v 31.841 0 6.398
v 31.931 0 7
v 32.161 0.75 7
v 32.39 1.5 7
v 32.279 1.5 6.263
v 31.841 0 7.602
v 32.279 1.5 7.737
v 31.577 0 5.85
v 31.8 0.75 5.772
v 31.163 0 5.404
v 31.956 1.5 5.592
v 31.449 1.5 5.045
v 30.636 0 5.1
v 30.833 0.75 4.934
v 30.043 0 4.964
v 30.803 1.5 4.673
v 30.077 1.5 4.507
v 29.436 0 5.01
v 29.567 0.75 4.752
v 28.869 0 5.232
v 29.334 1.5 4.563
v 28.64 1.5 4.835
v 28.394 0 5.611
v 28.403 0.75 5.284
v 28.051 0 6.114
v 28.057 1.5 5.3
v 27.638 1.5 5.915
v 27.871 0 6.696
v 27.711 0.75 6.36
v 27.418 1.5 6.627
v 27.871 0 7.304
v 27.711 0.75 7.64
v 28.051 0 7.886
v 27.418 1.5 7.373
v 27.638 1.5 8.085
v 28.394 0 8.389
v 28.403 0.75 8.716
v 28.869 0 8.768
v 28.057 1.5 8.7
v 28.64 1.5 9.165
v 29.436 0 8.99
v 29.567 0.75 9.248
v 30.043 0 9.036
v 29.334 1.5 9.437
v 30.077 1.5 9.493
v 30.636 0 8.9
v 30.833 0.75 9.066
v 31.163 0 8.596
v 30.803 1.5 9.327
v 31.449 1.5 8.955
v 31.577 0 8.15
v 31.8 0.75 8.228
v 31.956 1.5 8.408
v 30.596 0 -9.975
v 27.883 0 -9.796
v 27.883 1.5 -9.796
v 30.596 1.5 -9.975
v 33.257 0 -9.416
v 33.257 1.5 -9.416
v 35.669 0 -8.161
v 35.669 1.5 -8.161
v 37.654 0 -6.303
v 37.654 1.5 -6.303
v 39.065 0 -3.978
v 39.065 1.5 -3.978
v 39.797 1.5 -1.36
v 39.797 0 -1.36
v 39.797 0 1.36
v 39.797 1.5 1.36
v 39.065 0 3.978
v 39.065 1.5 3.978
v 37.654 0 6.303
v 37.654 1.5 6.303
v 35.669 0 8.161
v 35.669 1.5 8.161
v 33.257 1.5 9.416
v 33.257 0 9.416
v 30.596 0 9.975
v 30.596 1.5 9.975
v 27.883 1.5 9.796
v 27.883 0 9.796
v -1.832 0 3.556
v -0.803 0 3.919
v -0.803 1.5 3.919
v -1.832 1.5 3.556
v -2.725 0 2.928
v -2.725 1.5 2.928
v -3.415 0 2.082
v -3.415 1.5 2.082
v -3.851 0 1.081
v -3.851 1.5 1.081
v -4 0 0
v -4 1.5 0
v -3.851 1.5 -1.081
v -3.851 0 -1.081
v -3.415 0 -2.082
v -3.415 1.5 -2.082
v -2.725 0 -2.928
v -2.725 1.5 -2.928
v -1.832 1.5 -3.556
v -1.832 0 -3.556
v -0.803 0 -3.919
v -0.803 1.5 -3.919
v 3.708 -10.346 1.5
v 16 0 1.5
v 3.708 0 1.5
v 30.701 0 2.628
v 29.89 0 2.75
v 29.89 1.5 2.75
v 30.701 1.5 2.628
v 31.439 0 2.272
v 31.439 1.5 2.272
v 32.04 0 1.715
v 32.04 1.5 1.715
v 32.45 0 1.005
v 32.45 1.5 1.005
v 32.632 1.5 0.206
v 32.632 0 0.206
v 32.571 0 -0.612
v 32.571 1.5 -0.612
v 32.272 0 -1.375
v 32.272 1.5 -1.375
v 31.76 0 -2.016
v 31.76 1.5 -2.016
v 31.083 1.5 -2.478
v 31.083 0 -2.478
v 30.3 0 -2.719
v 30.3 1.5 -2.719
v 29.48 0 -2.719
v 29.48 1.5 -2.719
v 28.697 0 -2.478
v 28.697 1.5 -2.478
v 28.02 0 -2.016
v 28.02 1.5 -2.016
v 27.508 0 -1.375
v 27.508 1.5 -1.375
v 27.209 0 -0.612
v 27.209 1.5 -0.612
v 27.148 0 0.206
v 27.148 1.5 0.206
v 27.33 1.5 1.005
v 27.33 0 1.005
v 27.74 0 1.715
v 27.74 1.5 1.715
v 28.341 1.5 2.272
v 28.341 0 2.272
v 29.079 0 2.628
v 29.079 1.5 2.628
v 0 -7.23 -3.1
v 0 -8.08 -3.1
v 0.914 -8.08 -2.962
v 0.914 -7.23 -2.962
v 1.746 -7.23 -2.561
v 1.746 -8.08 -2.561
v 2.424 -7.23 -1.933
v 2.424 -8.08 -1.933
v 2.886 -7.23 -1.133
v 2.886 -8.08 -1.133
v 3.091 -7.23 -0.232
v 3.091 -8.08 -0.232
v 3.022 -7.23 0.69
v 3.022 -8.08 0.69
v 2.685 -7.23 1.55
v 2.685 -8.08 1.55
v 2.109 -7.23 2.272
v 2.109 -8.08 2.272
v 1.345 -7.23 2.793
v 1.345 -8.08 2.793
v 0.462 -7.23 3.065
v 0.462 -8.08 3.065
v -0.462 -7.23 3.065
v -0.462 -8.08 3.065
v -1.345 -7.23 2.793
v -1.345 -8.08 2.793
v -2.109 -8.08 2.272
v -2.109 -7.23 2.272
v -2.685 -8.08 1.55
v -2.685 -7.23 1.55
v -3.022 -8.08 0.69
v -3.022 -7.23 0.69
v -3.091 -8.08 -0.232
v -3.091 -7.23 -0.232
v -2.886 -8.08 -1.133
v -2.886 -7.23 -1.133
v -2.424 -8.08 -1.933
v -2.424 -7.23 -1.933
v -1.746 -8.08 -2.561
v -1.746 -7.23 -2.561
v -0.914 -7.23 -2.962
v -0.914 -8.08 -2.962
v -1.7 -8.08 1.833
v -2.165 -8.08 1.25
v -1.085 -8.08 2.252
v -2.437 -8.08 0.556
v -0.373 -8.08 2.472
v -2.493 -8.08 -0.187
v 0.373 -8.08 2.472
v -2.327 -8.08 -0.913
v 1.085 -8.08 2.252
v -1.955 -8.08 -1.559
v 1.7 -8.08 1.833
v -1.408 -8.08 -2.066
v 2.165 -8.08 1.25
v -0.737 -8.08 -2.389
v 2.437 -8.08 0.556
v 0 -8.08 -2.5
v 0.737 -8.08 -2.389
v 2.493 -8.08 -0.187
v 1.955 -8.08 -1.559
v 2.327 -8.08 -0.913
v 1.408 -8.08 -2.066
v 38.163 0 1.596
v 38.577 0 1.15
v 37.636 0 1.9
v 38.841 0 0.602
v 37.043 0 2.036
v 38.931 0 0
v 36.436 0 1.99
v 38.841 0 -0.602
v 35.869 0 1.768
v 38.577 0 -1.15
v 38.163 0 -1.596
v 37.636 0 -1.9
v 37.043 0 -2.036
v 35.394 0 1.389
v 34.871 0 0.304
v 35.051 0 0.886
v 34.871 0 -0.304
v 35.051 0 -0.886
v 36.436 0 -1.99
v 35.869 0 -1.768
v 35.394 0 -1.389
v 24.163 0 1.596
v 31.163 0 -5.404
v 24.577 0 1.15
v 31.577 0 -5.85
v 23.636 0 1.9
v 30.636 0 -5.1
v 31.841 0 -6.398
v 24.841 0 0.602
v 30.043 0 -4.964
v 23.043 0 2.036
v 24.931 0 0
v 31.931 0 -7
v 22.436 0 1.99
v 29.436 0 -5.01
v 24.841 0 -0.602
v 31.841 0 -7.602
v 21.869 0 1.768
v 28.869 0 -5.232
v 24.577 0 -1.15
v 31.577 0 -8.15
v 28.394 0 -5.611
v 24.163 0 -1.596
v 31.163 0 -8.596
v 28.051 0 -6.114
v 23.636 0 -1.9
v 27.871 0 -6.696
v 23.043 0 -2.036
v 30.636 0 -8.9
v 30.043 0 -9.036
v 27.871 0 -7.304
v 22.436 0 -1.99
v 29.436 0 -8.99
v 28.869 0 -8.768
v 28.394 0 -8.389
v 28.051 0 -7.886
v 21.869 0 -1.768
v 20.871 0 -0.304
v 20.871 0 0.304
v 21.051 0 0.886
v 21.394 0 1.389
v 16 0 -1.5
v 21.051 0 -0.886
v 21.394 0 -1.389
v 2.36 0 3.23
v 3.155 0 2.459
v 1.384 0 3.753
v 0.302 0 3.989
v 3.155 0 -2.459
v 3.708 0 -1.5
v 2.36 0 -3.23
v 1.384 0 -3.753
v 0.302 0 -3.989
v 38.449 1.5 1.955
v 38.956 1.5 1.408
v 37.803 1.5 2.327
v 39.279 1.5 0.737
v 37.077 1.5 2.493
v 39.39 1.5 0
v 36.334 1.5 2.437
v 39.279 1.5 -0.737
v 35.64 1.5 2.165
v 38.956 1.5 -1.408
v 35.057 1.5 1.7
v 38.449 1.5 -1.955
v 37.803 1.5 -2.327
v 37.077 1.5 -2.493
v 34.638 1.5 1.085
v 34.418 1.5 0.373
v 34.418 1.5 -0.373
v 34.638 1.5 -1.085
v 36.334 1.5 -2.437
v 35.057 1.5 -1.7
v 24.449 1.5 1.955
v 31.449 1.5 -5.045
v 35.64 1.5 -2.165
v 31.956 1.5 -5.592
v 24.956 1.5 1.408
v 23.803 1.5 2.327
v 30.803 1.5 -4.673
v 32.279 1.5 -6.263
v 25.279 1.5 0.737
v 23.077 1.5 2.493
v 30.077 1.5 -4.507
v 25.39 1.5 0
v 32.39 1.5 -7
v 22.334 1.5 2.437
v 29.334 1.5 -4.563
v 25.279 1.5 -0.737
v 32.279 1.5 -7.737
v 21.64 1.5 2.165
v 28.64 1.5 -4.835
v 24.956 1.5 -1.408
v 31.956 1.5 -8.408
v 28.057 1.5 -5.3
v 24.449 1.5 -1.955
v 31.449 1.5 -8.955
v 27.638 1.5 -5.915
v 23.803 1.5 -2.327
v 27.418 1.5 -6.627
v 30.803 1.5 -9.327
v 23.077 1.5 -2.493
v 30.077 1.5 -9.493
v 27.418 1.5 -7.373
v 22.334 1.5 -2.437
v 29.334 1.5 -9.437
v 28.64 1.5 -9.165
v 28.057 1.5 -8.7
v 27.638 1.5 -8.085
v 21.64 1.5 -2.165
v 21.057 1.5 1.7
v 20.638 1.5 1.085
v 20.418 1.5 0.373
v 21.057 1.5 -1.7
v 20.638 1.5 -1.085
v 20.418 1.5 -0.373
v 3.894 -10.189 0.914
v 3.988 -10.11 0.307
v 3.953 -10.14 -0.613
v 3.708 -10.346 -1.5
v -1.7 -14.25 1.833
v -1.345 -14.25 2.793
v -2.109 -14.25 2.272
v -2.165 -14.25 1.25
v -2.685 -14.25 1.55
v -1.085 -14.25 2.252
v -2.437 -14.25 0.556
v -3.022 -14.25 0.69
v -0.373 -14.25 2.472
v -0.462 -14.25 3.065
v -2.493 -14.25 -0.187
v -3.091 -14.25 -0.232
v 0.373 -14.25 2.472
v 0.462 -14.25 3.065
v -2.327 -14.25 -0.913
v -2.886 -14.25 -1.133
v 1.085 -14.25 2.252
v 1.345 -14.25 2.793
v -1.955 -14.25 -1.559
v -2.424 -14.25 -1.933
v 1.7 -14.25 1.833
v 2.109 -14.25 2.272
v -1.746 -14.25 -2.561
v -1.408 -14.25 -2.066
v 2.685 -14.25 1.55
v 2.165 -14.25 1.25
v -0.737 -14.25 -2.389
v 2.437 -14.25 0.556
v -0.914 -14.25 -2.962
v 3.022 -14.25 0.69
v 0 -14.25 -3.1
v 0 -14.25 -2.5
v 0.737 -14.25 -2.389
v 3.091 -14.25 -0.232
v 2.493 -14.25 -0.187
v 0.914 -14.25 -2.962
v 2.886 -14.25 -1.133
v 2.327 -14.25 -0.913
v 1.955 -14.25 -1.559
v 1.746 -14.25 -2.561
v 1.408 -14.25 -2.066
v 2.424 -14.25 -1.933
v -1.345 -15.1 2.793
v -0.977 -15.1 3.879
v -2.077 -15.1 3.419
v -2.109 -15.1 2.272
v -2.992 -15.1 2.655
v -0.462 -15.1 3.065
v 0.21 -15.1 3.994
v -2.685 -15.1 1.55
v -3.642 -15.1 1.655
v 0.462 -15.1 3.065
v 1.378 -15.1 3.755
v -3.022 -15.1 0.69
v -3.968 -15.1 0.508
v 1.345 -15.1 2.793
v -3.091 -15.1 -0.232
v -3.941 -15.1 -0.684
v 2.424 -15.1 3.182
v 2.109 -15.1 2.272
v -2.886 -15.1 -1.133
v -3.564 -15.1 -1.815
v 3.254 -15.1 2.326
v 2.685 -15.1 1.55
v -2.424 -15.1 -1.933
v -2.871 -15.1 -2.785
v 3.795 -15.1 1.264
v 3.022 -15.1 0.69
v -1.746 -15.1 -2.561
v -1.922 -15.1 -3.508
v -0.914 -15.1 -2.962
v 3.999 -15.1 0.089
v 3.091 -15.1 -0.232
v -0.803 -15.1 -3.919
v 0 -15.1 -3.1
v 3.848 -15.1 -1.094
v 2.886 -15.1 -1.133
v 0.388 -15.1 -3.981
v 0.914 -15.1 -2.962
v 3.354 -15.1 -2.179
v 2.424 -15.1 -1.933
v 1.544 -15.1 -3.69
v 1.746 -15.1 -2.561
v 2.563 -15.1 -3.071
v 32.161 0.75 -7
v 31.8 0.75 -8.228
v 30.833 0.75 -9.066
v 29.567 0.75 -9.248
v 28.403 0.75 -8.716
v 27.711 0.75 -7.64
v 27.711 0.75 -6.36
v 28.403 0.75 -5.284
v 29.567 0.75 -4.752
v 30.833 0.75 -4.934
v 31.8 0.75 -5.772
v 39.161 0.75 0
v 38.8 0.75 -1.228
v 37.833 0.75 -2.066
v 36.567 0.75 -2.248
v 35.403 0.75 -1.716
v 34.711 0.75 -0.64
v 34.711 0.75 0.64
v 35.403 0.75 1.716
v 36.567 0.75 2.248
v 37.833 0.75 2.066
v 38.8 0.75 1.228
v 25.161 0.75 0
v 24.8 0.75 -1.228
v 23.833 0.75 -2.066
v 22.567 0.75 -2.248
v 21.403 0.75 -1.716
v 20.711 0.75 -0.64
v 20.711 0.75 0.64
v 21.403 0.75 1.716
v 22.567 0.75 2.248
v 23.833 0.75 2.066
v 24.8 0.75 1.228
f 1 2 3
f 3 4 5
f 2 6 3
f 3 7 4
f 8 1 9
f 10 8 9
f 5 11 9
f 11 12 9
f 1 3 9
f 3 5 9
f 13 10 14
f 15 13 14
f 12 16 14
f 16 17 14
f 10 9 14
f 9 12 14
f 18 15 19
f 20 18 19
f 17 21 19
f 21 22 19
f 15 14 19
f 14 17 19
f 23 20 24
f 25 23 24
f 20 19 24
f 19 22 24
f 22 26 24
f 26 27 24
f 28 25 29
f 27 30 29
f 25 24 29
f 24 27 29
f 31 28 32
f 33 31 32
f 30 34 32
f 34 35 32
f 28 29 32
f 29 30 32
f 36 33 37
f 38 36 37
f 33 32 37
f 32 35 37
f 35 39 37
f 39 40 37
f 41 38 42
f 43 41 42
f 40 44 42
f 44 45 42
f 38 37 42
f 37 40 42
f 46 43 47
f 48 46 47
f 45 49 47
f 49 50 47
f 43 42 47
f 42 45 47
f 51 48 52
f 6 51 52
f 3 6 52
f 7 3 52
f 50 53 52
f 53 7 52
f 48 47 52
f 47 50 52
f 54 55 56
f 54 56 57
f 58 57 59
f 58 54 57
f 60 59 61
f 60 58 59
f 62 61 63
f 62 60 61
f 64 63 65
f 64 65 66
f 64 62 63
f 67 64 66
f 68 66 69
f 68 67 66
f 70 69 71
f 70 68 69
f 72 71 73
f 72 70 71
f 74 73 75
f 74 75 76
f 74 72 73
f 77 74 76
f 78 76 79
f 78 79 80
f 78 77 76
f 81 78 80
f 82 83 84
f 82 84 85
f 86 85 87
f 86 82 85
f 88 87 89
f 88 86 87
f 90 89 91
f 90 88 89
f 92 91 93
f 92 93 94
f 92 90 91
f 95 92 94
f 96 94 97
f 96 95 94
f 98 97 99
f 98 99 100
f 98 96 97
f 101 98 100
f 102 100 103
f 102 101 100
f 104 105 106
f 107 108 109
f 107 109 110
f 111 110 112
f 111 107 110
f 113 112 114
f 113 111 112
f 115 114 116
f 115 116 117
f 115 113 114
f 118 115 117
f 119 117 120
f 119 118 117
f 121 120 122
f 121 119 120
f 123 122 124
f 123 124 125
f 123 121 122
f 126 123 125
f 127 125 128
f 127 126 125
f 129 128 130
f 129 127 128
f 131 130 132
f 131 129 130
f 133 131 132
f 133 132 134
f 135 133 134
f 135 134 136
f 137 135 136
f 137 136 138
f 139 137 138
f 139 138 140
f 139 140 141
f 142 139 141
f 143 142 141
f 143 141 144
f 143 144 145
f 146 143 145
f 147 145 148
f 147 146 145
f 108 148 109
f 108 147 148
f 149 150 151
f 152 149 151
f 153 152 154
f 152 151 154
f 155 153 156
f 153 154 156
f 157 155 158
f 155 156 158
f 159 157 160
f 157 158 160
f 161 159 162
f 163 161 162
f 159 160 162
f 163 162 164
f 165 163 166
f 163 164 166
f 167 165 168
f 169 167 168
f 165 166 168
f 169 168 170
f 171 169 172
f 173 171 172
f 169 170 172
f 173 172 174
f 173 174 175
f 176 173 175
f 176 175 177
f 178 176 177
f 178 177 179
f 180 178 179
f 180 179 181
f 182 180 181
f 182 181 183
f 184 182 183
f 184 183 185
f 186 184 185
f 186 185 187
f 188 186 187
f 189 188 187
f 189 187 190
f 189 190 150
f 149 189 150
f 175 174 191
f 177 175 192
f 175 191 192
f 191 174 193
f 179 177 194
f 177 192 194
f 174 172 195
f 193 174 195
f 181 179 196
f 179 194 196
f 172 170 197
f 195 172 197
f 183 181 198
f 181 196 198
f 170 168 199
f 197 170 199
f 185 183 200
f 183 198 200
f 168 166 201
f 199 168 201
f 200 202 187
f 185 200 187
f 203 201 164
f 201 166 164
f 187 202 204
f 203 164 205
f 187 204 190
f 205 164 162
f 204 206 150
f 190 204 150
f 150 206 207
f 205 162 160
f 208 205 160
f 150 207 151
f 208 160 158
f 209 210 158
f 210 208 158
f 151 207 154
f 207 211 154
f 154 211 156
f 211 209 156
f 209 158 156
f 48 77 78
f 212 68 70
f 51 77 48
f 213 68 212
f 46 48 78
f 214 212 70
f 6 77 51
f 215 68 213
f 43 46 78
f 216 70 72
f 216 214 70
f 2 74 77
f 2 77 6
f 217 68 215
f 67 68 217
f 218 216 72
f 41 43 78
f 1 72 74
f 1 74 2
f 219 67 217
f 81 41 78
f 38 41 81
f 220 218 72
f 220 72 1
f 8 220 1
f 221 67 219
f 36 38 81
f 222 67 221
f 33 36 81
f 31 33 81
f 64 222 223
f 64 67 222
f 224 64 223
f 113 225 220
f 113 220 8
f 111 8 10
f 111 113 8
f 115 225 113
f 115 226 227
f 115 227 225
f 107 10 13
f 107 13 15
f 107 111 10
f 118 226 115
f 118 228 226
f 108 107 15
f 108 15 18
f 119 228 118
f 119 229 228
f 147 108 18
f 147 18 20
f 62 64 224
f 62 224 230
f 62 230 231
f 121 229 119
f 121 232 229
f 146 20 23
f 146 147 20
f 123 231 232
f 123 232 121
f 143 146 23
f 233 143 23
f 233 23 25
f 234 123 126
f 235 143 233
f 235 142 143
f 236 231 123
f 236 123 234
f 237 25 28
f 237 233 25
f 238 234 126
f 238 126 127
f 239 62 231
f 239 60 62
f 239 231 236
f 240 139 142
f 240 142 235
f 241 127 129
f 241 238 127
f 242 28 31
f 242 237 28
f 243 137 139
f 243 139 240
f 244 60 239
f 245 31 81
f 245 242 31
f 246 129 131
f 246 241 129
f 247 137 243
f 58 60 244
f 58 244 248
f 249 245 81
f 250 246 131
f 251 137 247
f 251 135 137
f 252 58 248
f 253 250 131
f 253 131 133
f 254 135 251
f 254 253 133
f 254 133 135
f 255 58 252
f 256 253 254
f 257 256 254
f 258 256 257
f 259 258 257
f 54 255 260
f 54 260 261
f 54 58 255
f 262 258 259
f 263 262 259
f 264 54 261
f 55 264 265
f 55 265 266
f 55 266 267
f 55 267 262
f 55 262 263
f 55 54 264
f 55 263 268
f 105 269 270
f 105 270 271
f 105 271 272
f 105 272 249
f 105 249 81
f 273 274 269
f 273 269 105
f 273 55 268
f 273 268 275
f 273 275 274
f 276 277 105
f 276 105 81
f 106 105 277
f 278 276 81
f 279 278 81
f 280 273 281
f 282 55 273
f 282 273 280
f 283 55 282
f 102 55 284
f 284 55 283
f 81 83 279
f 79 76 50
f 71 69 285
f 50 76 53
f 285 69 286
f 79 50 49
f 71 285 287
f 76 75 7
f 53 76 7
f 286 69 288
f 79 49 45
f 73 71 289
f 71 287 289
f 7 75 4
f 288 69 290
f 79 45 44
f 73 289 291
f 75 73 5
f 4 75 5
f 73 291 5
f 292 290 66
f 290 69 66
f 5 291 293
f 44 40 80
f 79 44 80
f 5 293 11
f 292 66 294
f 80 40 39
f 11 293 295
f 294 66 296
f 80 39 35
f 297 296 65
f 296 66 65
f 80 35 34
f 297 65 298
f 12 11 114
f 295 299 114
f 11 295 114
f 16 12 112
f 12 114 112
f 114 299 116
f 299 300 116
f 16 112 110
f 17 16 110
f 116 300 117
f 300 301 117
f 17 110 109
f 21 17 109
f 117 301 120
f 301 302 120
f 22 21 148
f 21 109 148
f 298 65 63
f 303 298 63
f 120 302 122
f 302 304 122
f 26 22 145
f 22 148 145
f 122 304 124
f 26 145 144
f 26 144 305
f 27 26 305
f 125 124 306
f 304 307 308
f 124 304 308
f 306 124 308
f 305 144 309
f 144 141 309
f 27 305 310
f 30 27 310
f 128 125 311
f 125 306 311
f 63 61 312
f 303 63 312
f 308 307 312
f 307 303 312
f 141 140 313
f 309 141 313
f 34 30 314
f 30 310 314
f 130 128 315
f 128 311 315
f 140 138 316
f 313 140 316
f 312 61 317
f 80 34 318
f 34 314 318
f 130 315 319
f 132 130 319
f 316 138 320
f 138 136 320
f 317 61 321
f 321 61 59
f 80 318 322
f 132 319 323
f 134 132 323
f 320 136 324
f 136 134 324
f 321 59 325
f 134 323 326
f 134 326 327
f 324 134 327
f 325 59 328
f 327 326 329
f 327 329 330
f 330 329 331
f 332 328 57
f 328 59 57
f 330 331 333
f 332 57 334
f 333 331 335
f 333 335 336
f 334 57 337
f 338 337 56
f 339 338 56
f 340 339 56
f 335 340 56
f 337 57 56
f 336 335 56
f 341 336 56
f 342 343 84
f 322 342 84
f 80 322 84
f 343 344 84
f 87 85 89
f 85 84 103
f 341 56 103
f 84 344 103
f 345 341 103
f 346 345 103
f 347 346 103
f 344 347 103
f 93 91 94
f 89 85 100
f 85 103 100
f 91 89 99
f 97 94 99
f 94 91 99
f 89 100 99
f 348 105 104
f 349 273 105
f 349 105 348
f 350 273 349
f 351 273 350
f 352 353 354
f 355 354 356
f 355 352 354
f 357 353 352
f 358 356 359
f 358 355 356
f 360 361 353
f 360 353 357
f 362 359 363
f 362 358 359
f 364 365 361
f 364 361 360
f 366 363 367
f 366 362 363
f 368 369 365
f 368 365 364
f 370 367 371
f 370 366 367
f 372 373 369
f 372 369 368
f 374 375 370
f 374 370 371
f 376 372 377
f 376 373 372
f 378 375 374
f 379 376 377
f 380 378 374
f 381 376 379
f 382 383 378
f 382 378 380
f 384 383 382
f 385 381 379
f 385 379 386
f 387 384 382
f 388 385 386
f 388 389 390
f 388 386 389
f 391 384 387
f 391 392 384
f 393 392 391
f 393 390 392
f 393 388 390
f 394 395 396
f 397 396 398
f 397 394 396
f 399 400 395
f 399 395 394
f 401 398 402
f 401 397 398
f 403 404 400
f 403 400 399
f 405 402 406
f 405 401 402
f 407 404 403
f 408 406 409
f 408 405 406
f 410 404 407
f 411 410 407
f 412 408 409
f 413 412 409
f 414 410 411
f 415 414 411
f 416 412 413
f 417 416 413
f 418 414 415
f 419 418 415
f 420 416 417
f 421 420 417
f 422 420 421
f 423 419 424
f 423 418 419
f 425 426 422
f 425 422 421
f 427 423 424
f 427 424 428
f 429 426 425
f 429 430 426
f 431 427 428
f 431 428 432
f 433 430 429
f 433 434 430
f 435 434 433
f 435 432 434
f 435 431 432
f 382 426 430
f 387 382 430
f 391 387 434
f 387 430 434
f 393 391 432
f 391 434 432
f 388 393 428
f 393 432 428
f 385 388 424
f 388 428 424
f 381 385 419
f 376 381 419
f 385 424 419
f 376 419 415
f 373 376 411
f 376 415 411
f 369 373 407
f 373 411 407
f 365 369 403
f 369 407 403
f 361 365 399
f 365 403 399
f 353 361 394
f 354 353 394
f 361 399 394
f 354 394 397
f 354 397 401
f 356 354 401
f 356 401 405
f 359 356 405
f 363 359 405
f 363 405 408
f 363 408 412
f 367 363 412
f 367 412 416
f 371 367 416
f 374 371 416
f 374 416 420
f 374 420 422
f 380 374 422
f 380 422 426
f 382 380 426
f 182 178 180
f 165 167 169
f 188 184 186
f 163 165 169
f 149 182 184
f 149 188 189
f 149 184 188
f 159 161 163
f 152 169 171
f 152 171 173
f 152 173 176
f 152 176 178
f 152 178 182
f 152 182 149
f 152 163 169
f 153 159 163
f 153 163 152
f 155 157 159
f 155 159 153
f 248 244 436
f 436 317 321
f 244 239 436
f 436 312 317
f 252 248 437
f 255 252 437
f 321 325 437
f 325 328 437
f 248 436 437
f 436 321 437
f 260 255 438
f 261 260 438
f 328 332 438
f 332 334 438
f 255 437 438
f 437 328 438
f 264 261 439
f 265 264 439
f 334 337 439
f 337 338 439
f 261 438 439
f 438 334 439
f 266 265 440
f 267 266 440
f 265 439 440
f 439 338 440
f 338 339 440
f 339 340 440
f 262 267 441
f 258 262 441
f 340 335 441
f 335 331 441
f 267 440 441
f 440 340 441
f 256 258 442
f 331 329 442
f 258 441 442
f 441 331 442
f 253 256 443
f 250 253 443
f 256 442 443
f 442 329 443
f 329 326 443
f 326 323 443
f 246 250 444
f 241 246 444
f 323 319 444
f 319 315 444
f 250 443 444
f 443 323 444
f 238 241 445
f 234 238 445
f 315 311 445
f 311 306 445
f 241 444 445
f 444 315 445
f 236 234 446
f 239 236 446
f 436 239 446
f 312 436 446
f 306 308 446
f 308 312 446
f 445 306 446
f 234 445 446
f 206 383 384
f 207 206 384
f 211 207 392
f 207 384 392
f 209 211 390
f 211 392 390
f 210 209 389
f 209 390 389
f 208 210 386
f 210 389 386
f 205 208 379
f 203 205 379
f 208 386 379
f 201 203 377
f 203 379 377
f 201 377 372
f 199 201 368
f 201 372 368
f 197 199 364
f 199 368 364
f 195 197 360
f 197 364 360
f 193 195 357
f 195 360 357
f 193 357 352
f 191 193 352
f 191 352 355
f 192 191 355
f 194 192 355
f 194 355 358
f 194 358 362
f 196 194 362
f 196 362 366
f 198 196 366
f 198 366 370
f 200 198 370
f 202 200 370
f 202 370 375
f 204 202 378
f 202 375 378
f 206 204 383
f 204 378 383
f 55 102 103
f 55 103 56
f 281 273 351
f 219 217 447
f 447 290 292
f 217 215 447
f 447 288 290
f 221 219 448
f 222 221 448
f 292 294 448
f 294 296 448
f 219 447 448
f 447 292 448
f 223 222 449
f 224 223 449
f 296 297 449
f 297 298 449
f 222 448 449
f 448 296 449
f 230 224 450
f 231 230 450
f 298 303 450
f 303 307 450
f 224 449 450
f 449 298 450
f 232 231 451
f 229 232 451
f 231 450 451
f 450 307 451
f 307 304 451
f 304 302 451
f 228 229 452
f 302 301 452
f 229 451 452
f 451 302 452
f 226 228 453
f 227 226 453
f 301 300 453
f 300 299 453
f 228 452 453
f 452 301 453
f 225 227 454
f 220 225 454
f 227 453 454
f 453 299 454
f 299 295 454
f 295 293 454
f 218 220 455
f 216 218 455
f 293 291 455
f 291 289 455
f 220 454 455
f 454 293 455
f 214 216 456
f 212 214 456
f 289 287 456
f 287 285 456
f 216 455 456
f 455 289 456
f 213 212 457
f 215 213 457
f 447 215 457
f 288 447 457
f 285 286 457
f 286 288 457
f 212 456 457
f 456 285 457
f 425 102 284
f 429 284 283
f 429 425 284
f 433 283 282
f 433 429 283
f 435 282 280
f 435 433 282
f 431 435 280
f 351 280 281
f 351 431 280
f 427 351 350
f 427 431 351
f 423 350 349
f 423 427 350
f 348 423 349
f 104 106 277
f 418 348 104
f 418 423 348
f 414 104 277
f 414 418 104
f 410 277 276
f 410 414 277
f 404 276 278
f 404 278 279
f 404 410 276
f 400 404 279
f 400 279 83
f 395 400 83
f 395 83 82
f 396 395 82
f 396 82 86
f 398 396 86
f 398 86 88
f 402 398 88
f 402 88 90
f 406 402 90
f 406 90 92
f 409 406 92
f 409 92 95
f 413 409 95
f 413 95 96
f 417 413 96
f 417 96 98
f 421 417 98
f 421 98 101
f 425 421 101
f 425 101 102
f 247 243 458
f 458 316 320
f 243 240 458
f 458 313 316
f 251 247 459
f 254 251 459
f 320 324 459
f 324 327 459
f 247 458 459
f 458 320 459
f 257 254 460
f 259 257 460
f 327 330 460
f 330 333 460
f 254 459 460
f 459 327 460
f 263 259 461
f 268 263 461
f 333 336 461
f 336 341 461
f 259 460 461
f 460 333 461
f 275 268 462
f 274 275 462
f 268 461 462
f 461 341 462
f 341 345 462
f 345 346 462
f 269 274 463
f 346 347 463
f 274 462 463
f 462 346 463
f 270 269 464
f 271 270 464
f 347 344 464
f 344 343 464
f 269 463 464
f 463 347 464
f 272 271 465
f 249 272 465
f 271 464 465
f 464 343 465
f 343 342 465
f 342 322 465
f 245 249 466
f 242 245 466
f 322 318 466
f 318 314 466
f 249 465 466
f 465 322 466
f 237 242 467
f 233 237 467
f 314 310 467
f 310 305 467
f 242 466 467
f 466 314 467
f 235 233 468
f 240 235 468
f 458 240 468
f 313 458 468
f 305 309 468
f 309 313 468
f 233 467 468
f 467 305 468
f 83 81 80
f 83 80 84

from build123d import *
from build123d.topology import SkipClean

# Parameters (mm, degrees)
CROQUIS1_R                      = 1.6
CROQUIS1_R_2                    = 2.75
SALIENTE_EXTRUIR1_DEPTH         = 1.5
SALIENTE_EXTRUIR3_START         = 15.1
CROQUIS3_R                      = 4
SALIENTE_EXTRUIR3_DEPTH         = 15.1
CROQUIS4_R                      = 3.1
CORTAR_EXTRUIR1_DEPTH           = 7.87
SALIENTE_EXTRUIR4_START         = -0.85
CROQUIS4_3_R                    = 3.1
CROQUIS4_3_R_2                  = 2.5
SALIENTE_EXTRUIR4_DEPTH         = 6.17
CROQUIS5_R                      = 2.5
CORTAR_EXTRUIR3_DEPTH           = 1.5
CORTAR_EXTRUIR3_DRAFT           = -17
CORTAR_EXTRUIR3_PROFILE_2_DEPTH = 1.5
CORTAR_EXTRUIR3_PROFILE_2_DRAFT = -17
CORTAR_EXTRUIR3_PROFILE_3_DEPTH = 1.5
CORTAR_EXTRUIR3_PROFILE_3_DRAFT = -17
CORTAR_EXTRUIR3_PROFILE_4_DEPTH = 1.5
CORTAR_EXTRUIR3_PROFILE_4_DRAFT = -17
NERVIO1_REACH                   = 45.809
CROQUIS6_WALL_W                 = 105.302560272
CROQUIS6_WALL_H                 = 3


with BuildPart() as part:
    # Croquis1 → Saliente-Extruir1 (new body)
    with BuildSketch(Plane(origin=(0, 0, 0), x_dir=(1, 0, 0), z_dir=(0, 1, 0))):
        with BuildLine():
            Line((-0.802944128, 3.918581469), (27.882639679, 9.796453672))
            ThreePointArc((27.882639679, 9.796453672), (39.89, 0), (27.882639679, -9.796453672))
            Line((27.882639679, -9.796453672), (-0.802944128, -3.918581469))
            ThreePointArc((-0.802944128, -3.918581469), (-4, 0), (-0.802944128, 3.918581469))
        make_face()
        with Locations(Location((29.89, 7, 0), (0, 0, 270))):
            Circle(CROQUIS1_R, mode=Mode.SUBTRACT)
        with Locations(Location((36.89, 0, 0), (0, 0, 270))):
            Circle(CROQUIS1_R, mode=Mode.SUBTRACT)
        with Locations(Location((29.89, -7, 0), (0, 0, 270))):
            Circle(CROQUIS1_R, mode=Mode.SUBTRACT)
        with Locations(Location((22.89, 0, 0), (0, 0, 270))):
            Circle(CROQUIS1_R, mode=Mode.SUBTRACT)
        with Locations(Location((29.89, 0, 0), (0, 0, 270))):
            Circle(CROQUIS1_R_2, mode=Mode.SUBTRACT)
    extrude(amount=SALIENTE_EXTRUIR1_DEPTH)

    # Croquis3 → Saliente-Extruir3 (add)
    with SkipClean():  # the faces are left unmerged after this step: merging them gives an invalid solid
        with BuildSketch(Plane.XZ.offset(SALIENTE_EXTRUIR3_START)):
            with Locations(Location((0, 0, 0), (0, 0, 258.419996521))):
                Circle(CROQUIS3_R)
        extrude(amount=-SALIENTE_EXTRUIR3_DEPTH)

    # Croquis4 → Cortar-Extruir1 (cut)
    with SkipClean():  # the faces are left unmerged after this step: merging them gives an invalid solid
        with BuildSketch(Plane.XZ.offset(15.1)):
            with Locations(Location((0, 0, 0), (0, 0, 270))):
                Circle(CROQUIS4_R)
        extrude(amount=-CORTAR_EXTRUIR1_DEPTH, mode=Mode.SUBTRACT)

    # Croquis4<3> → Saliente-Extruir4 (add)
    with SkipClean():  # the faces are left unmerged after this step: merging them gives an invalid solid
        with BuildSketch(Plane.XZ.offset(15.1).offset(SALIENTE_EXTRUIR4_START)):
            with Locations(Location((0, 0, 0), (0, 0, 270))):
                Circle(CROQUIS4_3_R)
            with Locations(Location((0, 0, 0), (0, 0, 270))):
                Circle(CROQUIS4_3_R_2, mode=Mode.SUBTRACT)
        extrude(amount=-SALIENTE_EXTRUIR4_DEPTH)


with BuildPart() as cortar_extruir3_tool:
    # Croquis5 → Cortar-Extruir3 (with draft: the straight prism first)
    with BuildSketch(Plane(origin=(0, 1.5, 0), x_dir=(1, 0, 0), z_dir=(0, 1, 0))):
        with Locations((29.89, 7)):
            Circle(CROQUIS5_R)
    extrude(amount=-CORTAR_EXTRUIR3_DEPTH)
    # Cortar-Extruir3: the draft: its side faces are tilted about the plane it starts from
    cortar_extruir3_sides = [cortar_extruir3_tool.faces().sort_by_distance(p)[0] for p in [
        (27.39, 0.75, -7),
    ]]
    draft(cortar_extruir3_sides, Plane(origin=(0, 1.5, 0), x_dir=(1, 0, 0), z_dir=(0, 1, 0)), CORTAR_EXTRUIR3_DRAFT)


with BuildPart() as part_1:
    add(part.part)

    # Cortar-Extruir3: cut by cortar_extruir3_tool
    add(cortar_extruir3_tool.part, mode=Mode.SUBTRACT)


with BuildPart() as cortar_extruir3_profile_2_tool:
    # Croquis5 → Cortar-Extruir3 profile 2 (with draft: the straight prism first)
    with BuildSketch(Plane(origin=(0, 1.5, 0), x_dir=(1, 0, 0), z_dir=(0, 1, 0))):
        with Locations((36.89, 0)):
            Circle(CROQUIS5_R)
    extrude(amount=-CORTAR_EXTRUIR3_PROFILE_2_DEPTH)
    # Cortar-Extruir3 profile 2: the draft: its side faces are tilted about the plane it starts from
    cortar_extruir3_profile_2_sides = [cortar_extruir3_profile_2_tool.faces().sort_by_distance(p)[0] for p in [
        (34.39, 0.75, 0),
    ]]
    draft(cortar_extruir3_profile_2_sides, Plane(origin=(0, 1.5, 0), x_dir=(1, 0, 0), z_dir=(0, 1, 0)), CORTAR_EXTRUIR3_PROFILE_2_DRAFT)


with BuildPart() as part_2:
    add(part_1.part)

    # Cortar-Extruir3 profile 2: cut by cortar_extruir3_profile_2_tool
    add(cortar_extruir3_profile_2_tool.part, mode=Mode.SUBTRACT)


with BuildPart() as cortar_extruir3_profile_3_tool:
    # Croquis5 → Cortar-Extruir3 profile 3 (with draft: the straight prism first)
    with BuildSketch(Plane(origin=(0, 1.5, 0), x_dir=(1, 0, 0), z_dir=(0, 1, 0))):
        with Locations((29.89, -7)):
            Circle(CROQUIS5_R)
    extrude(amount=-CORTAR_EXTRUIR3_PROFILE_3_DEPTH)
    # Cortar-Extruir3 profile 3: the draft: its side faces are tilted about the plane it starts from
    cortar_extruir3_profile_3_sides = [cortar_extruir3_profile_3_tool.faces().sort_by_distance(p)[0] for p in [
        (27.39, 0.75, 7),
    ]]
    draft(cortar_extruir3_profile_3_sides, Plane(origin=(0, 1.5, 0), x_dir=(1, 0, 0), z_dir=(0, 1, 0)), CORTAR_EXTRUIR3_PROFILE_3_DRAFT)


with BuildPart() as part_3:
    add(part_2.part)

    # Cortar-Extruir3 profile 3: cut by cortar_extruir3_profile_3_tool
    add(cortar_extruir3_profile_3_tool.part, mode=Mode.SUBTRACT)


with BuildPart() as cortar_extruir3_profile_4_tool:
    # Croquis5 → Cortar-Extruir3 profile 4 (with draft: the straight prism first)
    with BuildSketch(Plane(origin=(0, 1.5, 0), x_dir=(1, 0, 0), z_dir=(0, 1, 0))):
        with Locations((22.89, 0)):
            Circle(CROQUIS5_R)
    extrude(amount=-CORTAR_EXTRUIR3_PROFILE_4_DEPTH)
    # Cortar-Extruir3 profile 4: the draft: its side faces are tilted about the plane it starts from
    cortar_extruir3_profile_4_sides = [cortar_extruir3_profile_4_tool.faces().sort_by_distance(p)[0] for p in [
        (20.39, 0.75, 0),
    ]]
    draft(cortar_extruir3_profile_4_sides, Plane(origin=(0, 1.5, 0), x_dir=(1, 0, 0), z_dir=(0, 1, 0)), CORTAR_EXTRUIR3_PROFILE_4_DRAFT)


with BuildPart() as part_4:
    add(part_3.part)

    # Cortar-Extruir3 profile 4: cut by cortar_extruir3_profile_4_tool
    add(cortar_extruir3_profile_4_tool.part, mode=Mode.SUBTRACT)

    # Croquis6 wall → Nervio1 (add, up to next)
    with BuildSketch(Plane(origin=(10, -5.05, 0), x_dir=(-0.765076505499, -0.643939392128, 0), z_dir=(0.643939392128, -0.765076505499, 0)), mode=Mode.PRIVATE) as nervio1_sk1:
        Rectangle(CROQUIS6_WALL_W, CROQUIS6_WALL_H)
    nervio1_tool1 = extrude(nervio1_sk1.sketch, amount=-NERVIO1_REACH, mode=Mode.PRIVATE) - part_4.part
    add(nervio1_tool1.solids().sort_by_distance((10, -5.05, 0))[0])


solid = part_4.part
